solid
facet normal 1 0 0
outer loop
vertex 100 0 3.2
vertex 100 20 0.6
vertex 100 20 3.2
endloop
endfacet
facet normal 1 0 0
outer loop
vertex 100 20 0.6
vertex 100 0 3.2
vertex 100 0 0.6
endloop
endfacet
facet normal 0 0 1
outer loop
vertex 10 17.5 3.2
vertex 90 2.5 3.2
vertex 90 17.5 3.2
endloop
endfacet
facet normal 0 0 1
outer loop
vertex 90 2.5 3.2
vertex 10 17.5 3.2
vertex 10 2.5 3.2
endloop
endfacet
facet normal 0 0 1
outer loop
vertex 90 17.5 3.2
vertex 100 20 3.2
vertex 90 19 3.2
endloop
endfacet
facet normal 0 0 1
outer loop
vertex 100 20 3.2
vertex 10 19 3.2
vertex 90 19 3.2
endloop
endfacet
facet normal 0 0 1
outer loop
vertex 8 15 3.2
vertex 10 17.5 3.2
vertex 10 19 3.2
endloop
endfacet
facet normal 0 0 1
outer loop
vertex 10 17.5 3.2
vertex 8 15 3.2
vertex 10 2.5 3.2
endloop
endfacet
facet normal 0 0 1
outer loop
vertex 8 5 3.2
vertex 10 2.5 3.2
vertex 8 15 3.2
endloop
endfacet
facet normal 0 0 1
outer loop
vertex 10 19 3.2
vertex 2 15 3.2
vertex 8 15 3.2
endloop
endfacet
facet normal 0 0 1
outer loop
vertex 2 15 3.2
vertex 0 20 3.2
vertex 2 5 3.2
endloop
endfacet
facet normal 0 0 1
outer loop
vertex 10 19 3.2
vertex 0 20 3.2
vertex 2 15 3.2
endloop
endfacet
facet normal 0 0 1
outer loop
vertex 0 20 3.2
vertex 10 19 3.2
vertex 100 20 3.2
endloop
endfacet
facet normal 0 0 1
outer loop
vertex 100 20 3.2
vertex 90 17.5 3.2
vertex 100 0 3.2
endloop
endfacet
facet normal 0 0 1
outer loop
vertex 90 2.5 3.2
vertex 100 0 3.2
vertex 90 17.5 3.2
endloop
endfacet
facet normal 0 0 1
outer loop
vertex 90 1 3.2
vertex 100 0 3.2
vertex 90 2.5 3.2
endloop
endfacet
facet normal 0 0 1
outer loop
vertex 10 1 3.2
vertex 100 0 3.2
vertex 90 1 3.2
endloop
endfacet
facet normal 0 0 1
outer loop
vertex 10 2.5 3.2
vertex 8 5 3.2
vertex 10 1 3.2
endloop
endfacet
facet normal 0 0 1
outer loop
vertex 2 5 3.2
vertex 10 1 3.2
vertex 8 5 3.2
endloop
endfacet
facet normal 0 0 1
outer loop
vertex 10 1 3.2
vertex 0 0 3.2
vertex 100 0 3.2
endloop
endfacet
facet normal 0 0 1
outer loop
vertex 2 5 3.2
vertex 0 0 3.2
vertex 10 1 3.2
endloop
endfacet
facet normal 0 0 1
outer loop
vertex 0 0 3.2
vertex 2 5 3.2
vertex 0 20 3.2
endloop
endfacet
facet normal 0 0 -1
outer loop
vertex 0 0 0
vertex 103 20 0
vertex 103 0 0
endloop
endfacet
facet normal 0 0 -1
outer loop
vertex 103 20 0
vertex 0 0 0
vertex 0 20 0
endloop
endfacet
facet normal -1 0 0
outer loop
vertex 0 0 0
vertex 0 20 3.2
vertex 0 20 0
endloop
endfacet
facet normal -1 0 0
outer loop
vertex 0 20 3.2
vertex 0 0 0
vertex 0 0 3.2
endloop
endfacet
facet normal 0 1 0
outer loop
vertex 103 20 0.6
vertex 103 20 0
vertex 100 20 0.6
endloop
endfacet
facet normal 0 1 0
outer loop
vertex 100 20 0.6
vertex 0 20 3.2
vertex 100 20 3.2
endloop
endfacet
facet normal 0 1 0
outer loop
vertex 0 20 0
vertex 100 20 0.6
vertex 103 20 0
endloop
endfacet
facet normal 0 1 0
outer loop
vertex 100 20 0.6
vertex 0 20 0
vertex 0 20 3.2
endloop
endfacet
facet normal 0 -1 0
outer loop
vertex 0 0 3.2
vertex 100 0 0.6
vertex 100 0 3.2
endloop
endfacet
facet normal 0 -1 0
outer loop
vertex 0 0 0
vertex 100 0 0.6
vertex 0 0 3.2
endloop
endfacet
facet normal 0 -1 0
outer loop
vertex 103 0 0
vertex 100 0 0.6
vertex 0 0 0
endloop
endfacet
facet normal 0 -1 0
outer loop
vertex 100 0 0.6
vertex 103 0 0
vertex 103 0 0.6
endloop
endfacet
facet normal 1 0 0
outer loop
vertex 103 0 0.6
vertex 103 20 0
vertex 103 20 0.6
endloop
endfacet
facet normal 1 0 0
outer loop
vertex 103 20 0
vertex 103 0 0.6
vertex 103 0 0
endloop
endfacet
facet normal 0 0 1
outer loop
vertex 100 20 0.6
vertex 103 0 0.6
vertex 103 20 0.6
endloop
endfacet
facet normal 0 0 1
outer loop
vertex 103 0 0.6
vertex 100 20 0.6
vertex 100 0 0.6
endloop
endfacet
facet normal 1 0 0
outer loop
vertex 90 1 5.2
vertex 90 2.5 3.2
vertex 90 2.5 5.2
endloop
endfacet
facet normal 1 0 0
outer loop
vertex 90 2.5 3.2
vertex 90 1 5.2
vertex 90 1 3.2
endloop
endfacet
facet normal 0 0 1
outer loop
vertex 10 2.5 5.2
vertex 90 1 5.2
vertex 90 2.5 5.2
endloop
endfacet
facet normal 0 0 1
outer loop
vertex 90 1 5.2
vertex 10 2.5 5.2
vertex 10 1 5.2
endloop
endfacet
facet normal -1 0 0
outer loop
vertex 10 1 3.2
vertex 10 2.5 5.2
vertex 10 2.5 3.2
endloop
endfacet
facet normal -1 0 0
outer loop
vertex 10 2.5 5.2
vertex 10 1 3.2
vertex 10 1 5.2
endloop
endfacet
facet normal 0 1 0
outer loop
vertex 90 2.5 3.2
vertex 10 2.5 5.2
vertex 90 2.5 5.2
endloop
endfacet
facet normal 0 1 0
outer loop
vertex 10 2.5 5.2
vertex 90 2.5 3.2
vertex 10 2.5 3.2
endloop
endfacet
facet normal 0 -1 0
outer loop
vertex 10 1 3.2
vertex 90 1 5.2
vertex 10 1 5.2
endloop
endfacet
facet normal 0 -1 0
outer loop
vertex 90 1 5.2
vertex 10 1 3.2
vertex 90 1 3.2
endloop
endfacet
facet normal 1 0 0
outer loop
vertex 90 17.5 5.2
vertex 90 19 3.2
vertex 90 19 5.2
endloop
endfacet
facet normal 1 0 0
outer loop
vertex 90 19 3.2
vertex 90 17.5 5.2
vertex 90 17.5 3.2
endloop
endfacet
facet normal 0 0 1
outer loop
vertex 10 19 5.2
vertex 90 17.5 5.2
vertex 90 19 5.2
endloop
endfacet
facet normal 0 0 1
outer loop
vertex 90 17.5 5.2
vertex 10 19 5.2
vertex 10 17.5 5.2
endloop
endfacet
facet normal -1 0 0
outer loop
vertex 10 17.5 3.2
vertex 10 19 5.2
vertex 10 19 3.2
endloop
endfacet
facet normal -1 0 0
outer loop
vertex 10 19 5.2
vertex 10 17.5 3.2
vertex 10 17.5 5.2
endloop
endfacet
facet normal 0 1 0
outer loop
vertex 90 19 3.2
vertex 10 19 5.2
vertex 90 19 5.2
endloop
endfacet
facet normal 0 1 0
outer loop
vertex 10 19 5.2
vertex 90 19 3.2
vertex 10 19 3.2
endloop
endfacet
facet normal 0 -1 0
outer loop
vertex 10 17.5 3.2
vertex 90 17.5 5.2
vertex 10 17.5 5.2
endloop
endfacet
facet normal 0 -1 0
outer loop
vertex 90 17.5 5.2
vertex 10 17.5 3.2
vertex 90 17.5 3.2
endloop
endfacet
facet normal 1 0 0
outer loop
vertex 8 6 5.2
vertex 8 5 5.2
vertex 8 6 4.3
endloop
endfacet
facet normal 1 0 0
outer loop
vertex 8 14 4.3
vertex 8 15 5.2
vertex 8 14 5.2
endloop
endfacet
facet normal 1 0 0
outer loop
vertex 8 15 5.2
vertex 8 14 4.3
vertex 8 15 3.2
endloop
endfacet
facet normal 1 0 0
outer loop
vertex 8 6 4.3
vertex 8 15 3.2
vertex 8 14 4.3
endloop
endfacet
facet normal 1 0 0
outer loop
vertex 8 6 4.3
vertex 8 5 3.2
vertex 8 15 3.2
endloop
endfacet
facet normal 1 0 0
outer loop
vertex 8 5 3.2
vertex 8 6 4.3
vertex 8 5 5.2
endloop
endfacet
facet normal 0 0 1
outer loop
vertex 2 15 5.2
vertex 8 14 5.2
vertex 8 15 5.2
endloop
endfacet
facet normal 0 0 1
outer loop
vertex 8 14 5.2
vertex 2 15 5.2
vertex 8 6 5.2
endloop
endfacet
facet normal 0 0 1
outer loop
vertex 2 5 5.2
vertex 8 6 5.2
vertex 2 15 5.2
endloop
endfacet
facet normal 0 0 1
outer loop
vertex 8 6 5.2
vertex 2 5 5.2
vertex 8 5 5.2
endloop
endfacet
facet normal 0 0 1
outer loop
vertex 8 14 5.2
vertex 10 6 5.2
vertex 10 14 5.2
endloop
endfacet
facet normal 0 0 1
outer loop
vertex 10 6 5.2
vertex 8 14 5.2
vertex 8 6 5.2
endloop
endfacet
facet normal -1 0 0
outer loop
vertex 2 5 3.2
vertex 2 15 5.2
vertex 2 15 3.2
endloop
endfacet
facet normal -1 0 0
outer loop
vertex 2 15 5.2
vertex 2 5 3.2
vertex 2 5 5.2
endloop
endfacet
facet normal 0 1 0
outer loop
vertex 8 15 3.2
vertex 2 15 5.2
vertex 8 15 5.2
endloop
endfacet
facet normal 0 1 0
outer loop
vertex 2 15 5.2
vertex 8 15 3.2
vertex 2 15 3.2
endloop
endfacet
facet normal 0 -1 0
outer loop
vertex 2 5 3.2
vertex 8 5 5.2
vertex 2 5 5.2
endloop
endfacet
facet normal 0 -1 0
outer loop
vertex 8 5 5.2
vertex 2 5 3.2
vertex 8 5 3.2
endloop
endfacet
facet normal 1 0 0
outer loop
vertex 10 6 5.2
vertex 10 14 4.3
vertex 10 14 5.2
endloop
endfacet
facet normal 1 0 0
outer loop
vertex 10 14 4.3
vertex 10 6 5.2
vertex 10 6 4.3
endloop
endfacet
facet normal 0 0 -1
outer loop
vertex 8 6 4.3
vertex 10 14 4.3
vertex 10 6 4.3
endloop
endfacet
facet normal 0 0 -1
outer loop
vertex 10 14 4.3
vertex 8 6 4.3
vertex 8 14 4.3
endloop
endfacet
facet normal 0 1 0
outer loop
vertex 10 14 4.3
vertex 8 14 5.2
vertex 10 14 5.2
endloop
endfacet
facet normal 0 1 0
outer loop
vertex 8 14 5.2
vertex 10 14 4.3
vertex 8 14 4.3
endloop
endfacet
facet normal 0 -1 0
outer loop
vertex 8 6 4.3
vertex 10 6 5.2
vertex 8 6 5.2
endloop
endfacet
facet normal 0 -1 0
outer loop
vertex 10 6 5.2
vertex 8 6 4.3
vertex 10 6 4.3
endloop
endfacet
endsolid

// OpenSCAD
// Bag clip with living hinge - PETG, 0.4mm nozzle, no supports
// Printed open flat (two arms end-to-end), closes by folding 180deg about Y.
// Lower arm at origin, upper arm local origin at its hinge edge.

part = "arm_lower"; // [arm_lower, arm_upper, assembly]
cadverify_only = "";

/* Dimensions (mm) */
Lbody = 100;      // arm body length
Wbody = 20;       // arm width
Tbody = 3.2;      // arm thickness
Hhinge = 6;       // total hinge length (gap between bodies)
Hhalf = 3;        // hinge half length per arm
Thinge = 0.6;     // hinge thickness
Bgap = 2.0;       // bag thickness / closed gap
Ttot = Tbody + Bgap; // 5.2 closed inner top
Zpiv = Tbody + Bgap/2; // 4.2 pivot height
Xpiv = Lbody + Hhalf;  // 103 pivot X in assembly

module instance(name, part, unit = 1) {
    echo(cadverify_instance = [name, part, unit]);
    if (cadverify_only == "" || cadverify_only == name) children();
}

// ---------- lower arm geometry (print orientation, min at 0) ----------
module arm_lower() {
    // body
    cube([Lbody, Wbody, Tbody], false);
    // hinge half (thin, on bed), overlap 0.1 into body
    translate([Lbody-0.1, 0, 0])
        cube([Hhalf+0.1, Wbody, Thinge], false);
    // ribs (2mm tall standoff), overlap 0.1 into body
    translate([10, 1, Tbody-0.1])
        cube([80, 1.5, Bgap+0.1], false);
    translate([10, 17.5, Tbody-0.1])
        cube([80, 1.5, Bgap+0.1], false);
    // latch tower, overlap into body
    translate([2, 5, Tbody-0.1])
        cube([6, 10, Bgap+0.1], false);
    // latch lip (cantilever +X), overlap into tower
    translate([7.9, 6, 4.3])
        cube([2.1, 8, 0.9], false);
}

// ---------- upper arm geometry (print orientation, hinge at x=0) ----------
module arm_upper() {
    // hinge half on bed
    cube([Hhalf+0.1, Wbody, Thinge], false);
    // body, overlap into hinge
    translate([Hhalf-0.1, 0, 0])
        cube([Lbody+0.1, Wbody, Tbody], false);
    // latch tower (maps to closed x=12-18), overlap into body
    translate([85, 5, Tbody-0.1])
        cube([6, 10, Bgap+0.1], false);
    // latch lip (extends +X toward free end), overlap into tower
    translate([91, 6, 4.2])
        cube([2.8, 8, 1.0], false);
    // thumb tab beyond free end, same thickness as body, overlap
    translate([102.9, 6, 0])
        cube([8.1, 8, Tbody], false);
}

// ---------- part / assembly dispatch ----------
if (part == "arm_lower") {
    echo(cadverify_spec = [
        ["bounds", [[0, 0, 0], [103, 20, 5.2]]],
        ["bodies", 1],
        ["through_holes", 0],
        ["support_faces", [["bed", "-z", 1500]]],
        ["overhangs_allowed", [["latch lip", [[7.5, 5.5, 4.0], [10.5, 14.5, 5.5]]]]],
        ["copies", 1],
        ["details", [
            ["arm", "material", [[10, 5, 0.5], [90, 15, 2.7]], 0.9],
            ["arm_wall", "thickness", [50, 10, 10], [0, 0, -1], 3.2],
            ["hinge", "thickness", [101.5, 10, 5], [0, 0, -1], 0.6],
            ["rib", "material", [[20, 1.2, 3.5], [80, 2.3, 5.0]], 1],
            ["latch_tower", "material", [[3, 6, 3.5], [7, 14, 5.0]], 1],
            ["latch_lip", "material", [[8.5, 7, 4.5], [9.5, 13, 5.0]], 0.9],
            ["bag_slot", "void", [[20, 3, 3.5], [80, 17, 5.0]], 0.9]
        ]]
    ]);
    arm_lower();
} else if (part == "arm_upper") {
    echo(cadverify_spec = [
        ["bounds", [[0, 0, 0], [111, 20, 5.2]]],
        ["bodies", 1],
        ["through_holes", 0],
        ["support_faces", [["bed", "-z", 1500]]],
        ["overhangs_allowed", [["latch lip", [[90.5, 5.5, 4.0], [94.5, 14.5, 5.5]]]]],
        ["copies", 1],
        ["details", [
            ["arm", "material", [[10, 5, 0.5], [80, 15, 2.7]], 1],
            ["arm_wall", "thickness", [50, 10, 10], [0, 0, -1], 3.2],
            ["hinge", "thickness", [1.5, 10, 5], [0, 0, -1], 0.6],
            ["latch_tower", "material", [[86, 6, 3.5], [90, 14, 5.0]], 1],
            ["latch_lip", "material", [[91.5, 7, 4.4], [93.5, 13, 5.0]], 1],
            ["thumb_tab", "material", [[104, 7, 0.5], [110, 13, 2.7]], 1],
            ["field", "void", [[10, 3, 3.5], [80, 17, 5.0]], 1]
        ]]
    ]);
    arm_upper();
} else if (part == "assembly") {
    echo(cadverify_spec = [
        ["bounds", [[0, 0, 0], [214, 20, 5.2]]],
        ["support_faces", [["bed", "-z", 3000]]],
        ["motions", [
            ["close", ["upper"], "rotate", [103, 10, 4.2], [0, -1, 0], [0, 180],
                ["flex", [["upper", "lower", 1.0, "latch snap"]]],
                ["stops", [180]]
            ]
        ]],
        ["assembly_order", [
            [["lower"], [0, 0, 0]],
            [["upper"], [0, 0, -1]]
        ]]
    ]);
    instance("lower", "arm_lower") arm_lower();
    instance("upper", "arm_upper") translate([103, 0, 0]) arm_upper();
}
